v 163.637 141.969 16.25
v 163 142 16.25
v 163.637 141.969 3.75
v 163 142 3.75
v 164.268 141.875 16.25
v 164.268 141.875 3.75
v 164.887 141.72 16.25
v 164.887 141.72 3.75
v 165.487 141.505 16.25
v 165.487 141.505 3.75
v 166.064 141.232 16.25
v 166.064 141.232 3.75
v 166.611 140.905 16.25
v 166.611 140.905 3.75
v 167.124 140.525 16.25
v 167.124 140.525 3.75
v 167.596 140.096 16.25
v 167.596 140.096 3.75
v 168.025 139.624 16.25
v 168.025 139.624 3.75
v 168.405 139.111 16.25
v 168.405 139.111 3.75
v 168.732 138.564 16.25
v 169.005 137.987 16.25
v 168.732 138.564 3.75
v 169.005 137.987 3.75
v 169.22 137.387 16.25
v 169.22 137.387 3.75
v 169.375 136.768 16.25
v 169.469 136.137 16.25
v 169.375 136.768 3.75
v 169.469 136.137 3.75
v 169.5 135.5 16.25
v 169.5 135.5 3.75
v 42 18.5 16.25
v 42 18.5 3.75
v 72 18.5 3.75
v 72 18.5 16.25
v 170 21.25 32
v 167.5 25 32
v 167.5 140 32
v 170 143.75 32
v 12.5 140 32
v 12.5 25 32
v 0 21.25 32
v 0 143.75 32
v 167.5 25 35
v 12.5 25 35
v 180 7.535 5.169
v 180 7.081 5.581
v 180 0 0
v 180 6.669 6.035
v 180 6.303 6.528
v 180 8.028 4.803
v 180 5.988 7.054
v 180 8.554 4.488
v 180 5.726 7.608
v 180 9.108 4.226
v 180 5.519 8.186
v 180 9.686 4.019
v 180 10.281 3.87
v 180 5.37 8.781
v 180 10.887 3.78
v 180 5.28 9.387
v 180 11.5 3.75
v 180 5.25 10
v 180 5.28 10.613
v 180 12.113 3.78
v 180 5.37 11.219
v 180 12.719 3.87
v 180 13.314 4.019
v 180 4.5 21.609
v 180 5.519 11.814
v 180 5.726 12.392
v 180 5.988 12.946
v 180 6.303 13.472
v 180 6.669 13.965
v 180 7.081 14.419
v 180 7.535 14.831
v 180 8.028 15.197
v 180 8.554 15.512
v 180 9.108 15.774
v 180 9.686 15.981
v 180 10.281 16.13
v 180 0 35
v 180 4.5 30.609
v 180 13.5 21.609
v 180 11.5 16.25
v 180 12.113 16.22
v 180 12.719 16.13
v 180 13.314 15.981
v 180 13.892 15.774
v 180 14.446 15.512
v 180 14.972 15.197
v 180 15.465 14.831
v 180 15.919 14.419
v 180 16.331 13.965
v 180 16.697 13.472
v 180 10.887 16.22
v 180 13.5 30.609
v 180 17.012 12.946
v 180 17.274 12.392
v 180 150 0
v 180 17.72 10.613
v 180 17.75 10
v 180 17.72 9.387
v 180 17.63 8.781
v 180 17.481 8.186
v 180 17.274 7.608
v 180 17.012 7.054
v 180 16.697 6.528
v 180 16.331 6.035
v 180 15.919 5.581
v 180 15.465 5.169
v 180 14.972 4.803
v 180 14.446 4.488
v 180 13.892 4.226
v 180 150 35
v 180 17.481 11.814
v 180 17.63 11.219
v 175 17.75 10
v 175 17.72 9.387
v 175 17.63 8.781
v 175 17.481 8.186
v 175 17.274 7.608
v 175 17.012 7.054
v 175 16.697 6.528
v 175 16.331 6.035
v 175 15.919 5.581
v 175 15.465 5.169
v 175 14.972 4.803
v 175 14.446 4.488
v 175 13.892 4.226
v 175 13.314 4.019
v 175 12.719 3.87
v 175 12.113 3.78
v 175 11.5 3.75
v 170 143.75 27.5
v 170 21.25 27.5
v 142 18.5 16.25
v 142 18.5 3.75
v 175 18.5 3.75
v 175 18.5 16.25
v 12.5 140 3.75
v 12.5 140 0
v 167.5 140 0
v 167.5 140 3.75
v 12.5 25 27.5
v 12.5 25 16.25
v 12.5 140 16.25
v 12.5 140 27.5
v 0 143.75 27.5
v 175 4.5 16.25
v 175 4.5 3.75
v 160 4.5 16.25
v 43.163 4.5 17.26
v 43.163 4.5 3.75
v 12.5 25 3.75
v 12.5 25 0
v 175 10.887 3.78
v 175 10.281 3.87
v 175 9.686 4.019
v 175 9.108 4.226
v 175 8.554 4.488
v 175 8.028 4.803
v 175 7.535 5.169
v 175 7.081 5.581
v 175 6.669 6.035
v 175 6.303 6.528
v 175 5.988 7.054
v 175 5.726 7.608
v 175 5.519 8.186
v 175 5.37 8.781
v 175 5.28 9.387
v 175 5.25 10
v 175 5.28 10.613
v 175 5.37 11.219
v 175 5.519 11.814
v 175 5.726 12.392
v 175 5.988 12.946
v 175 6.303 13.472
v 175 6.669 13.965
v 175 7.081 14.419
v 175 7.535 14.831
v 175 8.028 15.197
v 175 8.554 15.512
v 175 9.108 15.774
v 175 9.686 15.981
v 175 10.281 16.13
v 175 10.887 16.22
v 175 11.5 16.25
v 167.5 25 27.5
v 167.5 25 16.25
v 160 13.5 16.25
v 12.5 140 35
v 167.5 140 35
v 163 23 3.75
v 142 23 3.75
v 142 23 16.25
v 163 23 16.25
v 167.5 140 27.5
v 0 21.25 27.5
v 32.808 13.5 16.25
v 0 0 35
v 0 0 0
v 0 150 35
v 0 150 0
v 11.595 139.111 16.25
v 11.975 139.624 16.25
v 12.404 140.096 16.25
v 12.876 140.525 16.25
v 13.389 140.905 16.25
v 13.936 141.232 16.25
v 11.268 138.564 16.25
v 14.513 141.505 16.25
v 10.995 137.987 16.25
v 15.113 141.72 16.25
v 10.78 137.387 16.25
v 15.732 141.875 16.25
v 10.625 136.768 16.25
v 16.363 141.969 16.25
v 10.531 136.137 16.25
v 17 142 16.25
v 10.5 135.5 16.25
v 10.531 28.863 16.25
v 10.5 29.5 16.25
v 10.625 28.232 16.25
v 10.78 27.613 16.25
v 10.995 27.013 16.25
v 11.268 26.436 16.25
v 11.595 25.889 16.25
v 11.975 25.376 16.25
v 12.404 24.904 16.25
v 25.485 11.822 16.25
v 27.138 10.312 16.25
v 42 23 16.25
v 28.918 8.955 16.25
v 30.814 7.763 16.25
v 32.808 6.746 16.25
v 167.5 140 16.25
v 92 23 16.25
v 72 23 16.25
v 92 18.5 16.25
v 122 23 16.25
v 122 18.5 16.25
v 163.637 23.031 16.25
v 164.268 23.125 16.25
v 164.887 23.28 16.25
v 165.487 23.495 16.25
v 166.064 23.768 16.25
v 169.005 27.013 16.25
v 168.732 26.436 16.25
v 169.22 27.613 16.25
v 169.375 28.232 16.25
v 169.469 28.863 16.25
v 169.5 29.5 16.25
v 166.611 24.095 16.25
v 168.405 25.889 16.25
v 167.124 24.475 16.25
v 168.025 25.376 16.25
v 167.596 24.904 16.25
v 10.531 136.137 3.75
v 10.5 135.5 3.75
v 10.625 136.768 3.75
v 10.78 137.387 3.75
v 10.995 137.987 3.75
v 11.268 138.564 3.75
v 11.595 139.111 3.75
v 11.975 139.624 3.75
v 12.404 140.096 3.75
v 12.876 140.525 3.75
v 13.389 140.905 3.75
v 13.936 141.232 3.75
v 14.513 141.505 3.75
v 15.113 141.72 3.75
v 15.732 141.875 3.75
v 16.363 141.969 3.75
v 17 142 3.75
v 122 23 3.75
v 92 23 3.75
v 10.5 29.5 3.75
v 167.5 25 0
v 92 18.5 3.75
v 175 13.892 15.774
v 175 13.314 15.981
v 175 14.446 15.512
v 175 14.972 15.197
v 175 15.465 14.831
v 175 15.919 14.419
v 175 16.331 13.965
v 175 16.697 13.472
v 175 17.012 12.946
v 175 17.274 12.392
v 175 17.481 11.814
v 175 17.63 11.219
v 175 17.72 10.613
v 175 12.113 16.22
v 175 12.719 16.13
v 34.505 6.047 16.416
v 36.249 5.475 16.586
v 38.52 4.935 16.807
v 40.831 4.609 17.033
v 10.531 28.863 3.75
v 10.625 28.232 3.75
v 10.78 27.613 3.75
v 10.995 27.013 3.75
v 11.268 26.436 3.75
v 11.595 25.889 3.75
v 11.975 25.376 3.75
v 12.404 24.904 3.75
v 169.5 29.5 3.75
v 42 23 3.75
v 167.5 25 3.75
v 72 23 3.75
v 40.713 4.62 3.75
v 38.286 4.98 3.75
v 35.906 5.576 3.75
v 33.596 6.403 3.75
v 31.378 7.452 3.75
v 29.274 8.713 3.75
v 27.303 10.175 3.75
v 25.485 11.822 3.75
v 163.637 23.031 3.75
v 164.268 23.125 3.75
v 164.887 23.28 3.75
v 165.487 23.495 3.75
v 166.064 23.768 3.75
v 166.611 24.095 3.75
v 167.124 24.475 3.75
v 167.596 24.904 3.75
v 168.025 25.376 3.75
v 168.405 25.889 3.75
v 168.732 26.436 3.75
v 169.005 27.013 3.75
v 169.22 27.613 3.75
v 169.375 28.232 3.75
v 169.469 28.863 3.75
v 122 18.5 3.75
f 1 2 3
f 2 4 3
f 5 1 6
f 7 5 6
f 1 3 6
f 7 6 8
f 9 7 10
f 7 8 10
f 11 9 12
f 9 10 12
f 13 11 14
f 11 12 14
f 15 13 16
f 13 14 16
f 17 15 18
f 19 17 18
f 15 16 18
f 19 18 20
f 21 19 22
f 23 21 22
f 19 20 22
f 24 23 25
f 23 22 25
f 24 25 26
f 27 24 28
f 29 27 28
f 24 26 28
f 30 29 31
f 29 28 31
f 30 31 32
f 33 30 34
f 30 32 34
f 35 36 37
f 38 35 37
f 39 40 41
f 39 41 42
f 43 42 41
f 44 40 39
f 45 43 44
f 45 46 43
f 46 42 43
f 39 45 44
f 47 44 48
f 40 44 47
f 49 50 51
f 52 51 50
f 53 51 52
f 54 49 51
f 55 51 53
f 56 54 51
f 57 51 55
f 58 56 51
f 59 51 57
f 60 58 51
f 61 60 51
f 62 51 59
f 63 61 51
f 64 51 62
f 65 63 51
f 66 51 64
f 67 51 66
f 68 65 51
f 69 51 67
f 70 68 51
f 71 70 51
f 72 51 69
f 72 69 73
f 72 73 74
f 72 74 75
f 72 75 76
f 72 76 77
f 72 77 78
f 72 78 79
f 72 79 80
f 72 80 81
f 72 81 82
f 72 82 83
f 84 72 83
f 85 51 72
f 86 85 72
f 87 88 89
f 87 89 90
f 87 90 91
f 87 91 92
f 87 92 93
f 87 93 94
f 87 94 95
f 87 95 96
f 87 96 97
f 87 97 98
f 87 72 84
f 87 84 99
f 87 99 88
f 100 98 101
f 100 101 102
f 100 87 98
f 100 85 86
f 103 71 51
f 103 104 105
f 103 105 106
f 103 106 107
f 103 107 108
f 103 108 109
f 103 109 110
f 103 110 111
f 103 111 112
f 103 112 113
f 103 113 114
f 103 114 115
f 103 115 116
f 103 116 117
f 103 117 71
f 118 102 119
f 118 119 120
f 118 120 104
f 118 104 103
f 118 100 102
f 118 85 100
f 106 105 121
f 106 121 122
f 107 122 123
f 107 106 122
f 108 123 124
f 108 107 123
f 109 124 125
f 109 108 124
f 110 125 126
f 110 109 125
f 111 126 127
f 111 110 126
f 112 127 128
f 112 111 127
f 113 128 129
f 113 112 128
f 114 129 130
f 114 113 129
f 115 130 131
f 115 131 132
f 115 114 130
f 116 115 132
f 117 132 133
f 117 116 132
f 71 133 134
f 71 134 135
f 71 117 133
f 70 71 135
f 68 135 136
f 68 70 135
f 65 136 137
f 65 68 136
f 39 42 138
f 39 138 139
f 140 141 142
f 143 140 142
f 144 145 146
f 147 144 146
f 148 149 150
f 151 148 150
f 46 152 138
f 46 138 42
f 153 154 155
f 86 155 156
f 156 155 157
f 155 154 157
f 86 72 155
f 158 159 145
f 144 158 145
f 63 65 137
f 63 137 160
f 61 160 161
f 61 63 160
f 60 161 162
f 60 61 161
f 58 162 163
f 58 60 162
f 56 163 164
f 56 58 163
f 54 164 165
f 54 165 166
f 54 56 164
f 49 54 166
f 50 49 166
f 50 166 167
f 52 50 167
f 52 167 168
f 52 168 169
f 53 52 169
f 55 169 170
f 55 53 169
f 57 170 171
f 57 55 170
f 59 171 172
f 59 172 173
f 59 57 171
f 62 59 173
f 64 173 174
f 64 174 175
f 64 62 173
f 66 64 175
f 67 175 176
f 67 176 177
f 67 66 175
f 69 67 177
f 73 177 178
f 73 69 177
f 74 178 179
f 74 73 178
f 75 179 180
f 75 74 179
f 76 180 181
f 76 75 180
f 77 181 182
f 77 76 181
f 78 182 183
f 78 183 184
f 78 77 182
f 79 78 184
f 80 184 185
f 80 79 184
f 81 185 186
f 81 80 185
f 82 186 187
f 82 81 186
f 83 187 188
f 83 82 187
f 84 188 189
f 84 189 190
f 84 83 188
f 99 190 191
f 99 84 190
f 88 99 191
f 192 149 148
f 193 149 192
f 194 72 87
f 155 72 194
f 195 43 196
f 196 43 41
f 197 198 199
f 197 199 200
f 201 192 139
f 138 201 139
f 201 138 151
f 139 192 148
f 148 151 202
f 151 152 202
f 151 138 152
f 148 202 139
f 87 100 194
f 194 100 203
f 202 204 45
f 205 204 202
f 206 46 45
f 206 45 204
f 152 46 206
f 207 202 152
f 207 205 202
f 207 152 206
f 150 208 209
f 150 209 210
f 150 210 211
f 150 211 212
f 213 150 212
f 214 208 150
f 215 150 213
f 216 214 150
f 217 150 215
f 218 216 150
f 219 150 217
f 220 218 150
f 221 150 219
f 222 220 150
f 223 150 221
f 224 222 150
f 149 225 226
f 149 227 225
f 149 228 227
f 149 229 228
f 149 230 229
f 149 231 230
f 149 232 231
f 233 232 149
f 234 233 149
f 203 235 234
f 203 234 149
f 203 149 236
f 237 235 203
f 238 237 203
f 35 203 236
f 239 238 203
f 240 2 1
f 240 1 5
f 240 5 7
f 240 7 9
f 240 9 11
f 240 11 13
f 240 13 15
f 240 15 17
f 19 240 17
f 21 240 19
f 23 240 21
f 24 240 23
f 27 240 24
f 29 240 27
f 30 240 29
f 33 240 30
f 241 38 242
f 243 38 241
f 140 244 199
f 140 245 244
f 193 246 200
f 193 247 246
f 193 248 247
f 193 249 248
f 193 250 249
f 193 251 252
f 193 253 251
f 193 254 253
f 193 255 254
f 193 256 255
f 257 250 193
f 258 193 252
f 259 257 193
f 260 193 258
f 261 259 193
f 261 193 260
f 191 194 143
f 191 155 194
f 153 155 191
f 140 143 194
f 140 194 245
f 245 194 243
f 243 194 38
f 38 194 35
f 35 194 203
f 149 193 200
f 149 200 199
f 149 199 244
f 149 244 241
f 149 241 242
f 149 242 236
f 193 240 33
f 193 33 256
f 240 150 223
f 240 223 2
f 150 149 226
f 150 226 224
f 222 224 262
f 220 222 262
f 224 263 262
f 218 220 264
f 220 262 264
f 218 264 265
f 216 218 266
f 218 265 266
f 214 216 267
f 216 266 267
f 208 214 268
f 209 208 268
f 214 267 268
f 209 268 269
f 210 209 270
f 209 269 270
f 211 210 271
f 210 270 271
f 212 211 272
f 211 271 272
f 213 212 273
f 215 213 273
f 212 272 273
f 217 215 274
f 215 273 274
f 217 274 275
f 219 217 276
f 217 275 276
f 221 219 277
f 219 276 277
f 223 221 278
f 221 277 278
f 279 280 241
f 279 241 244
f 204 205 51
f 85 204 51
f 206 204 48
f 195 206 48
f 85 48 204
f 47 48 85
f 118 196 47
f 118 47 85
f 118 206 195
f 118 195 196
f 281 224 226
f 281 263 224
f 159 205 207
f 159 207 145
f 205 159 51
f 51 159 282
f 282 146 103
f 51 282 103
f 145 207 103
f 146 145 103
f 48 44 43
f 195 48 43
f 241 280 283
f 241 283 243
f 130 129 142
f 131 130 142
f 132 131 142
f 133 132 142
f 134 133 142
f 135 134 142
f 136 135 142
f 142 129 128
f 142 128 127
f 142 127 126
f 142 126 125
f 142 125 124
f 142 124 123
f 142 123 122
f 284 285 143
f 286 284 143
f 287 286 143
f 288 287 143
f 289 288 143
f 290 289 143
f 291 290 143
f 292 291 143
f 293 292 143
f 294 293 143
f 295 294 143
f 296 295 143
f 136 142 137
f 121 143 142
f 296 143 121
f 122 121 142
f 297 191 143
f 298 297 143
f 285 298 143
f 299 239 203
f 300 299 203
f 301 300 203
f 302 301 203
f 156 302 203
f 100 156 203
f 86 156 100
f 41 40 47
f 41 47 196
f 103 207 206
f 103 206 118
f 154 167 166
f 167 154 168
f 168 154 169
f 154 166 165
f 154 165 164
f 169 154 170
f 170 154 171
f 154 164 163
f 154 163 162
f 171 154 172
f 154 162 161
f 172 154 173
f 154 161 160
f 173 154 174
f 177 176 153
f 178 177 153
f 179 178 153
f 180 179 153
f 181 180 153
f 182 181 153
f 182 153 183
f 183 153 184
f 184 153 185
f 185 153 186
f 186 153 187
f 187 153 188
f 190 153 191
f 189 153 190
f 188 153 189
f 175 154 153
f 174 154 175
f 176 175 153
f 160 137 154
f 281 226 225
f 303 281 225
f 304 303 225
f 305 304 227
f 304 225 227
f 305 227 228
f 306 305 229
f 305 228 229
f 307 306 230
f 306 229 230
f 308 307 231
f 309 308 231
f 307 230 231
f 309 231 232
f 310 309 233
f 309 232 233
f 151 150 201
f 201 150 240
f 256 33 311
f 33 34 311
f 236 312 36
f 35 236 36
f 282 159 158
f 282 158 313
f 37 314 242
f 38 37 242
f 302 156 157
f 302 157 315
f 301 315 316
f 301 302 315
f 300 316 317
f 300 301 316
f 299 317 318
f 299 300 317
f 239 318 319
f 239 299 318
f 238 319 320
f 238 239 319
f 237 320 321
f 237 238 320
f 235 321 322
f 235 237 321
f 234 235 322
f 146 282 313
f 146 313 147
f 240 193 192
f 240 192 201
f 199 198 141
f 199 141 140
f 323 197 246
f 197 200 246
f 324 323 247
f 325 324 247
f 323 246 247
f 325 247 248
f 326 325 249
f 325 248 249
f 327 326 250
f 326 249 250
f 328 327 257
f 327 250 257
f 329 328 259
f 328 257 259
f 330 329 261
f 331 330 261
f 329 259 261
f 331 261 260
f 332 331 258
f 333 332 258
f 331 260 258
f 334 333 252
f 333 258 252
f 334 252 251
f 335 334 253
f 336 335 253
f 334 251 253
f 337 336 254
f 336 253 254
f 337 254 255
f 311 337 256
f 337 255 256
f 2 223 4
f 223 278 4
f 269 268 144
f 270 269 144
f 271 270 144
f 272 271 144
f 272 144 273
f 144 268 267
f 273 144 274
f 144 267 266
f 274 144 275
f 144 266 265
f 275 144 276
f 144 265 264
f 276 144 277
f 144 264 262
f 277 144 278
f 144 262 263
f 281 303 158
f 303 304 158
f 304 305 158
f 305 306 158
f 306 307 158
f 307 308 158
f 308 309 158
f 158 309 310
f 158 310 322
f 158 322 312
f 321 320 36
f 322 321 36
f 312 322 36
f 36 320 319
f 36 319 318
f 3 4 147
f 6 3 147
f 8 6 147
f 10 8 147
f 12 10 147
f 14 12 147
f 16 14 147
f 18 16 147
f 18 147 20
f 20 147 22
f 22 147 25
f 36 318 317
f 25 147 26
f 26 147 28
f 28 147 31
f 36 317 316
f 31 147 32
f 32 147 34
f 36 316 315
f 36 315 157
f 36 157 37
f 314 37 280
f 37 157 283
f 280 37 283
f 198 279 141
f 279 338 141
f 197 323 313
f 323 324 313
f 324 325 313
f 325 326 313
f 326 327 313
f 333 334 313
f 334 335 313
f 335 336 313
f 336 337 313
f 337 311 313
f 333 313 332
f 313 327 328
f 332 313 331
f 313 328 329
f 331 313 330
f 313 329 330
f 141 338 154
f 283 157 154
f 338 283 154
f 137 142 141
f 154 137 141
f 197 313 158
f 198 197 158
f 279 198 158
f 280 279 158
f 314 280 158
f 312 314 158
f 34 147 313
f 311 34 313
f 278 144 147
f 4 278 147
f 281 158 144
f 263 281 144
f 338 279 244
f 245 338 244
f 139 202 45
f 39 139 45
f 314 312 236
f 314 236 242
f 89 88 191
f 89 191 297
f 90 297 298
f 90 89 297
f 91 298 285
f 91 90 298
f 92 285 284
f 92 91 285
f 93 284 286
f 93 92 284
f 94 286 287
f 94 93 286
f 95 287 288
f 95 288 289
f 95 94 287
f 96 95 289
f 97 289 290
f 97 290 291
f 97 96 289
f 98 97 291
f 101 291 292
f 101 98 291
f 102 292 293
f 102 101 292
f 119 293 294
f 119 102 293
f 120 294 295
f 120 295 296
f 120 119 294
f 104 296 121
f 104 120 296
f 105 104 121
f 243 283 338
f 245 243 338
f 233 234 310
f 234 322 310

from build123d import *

# Parameters (mm, degrees)
F0_W      = 180
F0_H      = 150
F0_W_2    = 155
F0_H_2    = 115
F1_DEPTH  = 35
F2_W      = 122.5
F2_H      = 4.5
F3_DEPTH  = 170
F5_W      = 159
F5_H      = 119
F6_DEPTH  = 6.25
F7_R      = 6.5
F9_DEPTH  = 6.25
F11_DEPTH = 9
F12_R     = 25
F14_DEPTH = 5
F15_W     = 20
F15_H     = 12.5
F16_DEPTH = 4.5


with BuildPart() as f1:
    # F0 (on Top) → F1 (new body)
    with BuildSketch(Plane.XY):
        with Locations((90, 75)):
            Rectangle(F0_W, F0_H)
        with Locations((90, 82.5)):
            Rectangle(F0_W_2, F0_H_2, mode=Mode.SUBTRACT)
    extrude(amount=F1_DEPTH)

    # F2 (on face) → F3 (cut)
    with BuildSketch(Plane(origin=(0, 0, 0), x_dir=(0, -1, 0), z_dir=(-1, 0, 0))):
        with Locations((-82.5, 29.75)):
            Rectangle(F2_W, F2_H)
    extrude(amount=-F3_DEPTH, mode=Mode.SUBTRACT)

    # F5 (on offset) → F6 (cut, symmetric)
    with BuildSketch(Plane(origin=(0, 0, 10), x_dir=(1, 0, 0), z_dir=(0, 0, -1))):
        with Locations((90, -82.5)):
            Rectangle(F5_W, F5_H)
    extrude(amount=F6_DEPTH, both=True, mode=Mode.SUBTRACT)

    # F7
    f7_edges = [f1.edges().sort_by_distance(p)[0] for p in [
        (169.5, 142, 10),
        (10.5, 142, 10),
        (10.5, 23, 10),
        (169.5, 23, 10),
    ]]
    fillet(f7_edges, radius=F7_R)

    # F8 (on offset) → F9 (cut, symmetric)
    with BuildSketch(Plane(origin=(0, 0, 10), x_dir=(1, 0, 0), z_dir=(0, 0, -1))):
        with BuildLine():
            Line((32.8076118446, -4.5), (12.4038059223, -24.9038059223))
            ThreePointArc((12.4038059223, -24.9038059223), (14.5125576896, -23.4947830387), (17, -23))
            Line((17, -23), (42, -23))
            Line((42, -23), (42, -18.5))
            Line((42, -18.5), (180, -18.5))
            Line((180, -18.5), (180, -4.5))
            Line((180, -4.5), (32.8076118446, -4.5))
        make_face()
    extrude(amount=F9_DEPTH, both=True, mode=Mode.SUBTRACT)

    # F10 (on face) → F11 (cut)
    with BuildSketch(Plane(origin=(0, 4.5, 0), x_dir=(-1, 0, 0), z_dir=(0, 1, 0))):
        Polygon((-160, 16.25), (-125.2266702536, 16.25), (-32.8076118446, 16.25), (-180, 30.6089838486), (-180, 21.6089838486), align=None)
    extrude(amount=F11_DEPTH, mode=Mode.SUBTRACT)

    # F12
    f12_edges = [f1.edges().sort_by_distance(p)[0] for p in [
        (32.807612, 4.5, 10),
    ]]
    fillet(f12_edges, radius=F12_R)

    # F13 (on face) → F14 (join)
    with BuildSketch(Plane.YZ.offset(180)):
        with BuildLine():
            ThreePointArc((11.5, 16.25), (15.9194173824, 14.4194173824), (17.75, 10))
            ThreePointArc((17.75, 10), (15.9194173824, 5.5805826176), (11.5, 3.75))
            Line((11.5, 3.75), (18.5, 3.75))
            Line((18.5, 3.75), (18.5, 16.25))
            Line((18.5, 16.25), (11.5, 16.25))
        make_face()
        with BuildLine():
            ThreePointArc((11.5, 3.75), (5.25, 10), (11.5, 16.25))
            Line((11.5, 16.25), (4.5, 16.25))
            Line((4.5, 16.25), (4.5, 3.75))
            Line((4.5, 3.75), (11.5, 3.75))
        make_face()
    extrude(amount=-F14_DEPTH)

    # F15 (on face) → F16 (cut, through all)
    with BuildSketch(Plane(origin=(0, 23, 0), x_dir=(-1, 0, 0), z_dir=(0, 1, 0))):
        with Locations((-132, 10)):
            Rectangle(F15_W, F15_H)
        with Locations((-82, 10)):
            Rectangle(F15_W, F15_H)
    extrude(amount=-F16_DEPTH, mode=Mode.SUBTRACT)


solid = f1.part
